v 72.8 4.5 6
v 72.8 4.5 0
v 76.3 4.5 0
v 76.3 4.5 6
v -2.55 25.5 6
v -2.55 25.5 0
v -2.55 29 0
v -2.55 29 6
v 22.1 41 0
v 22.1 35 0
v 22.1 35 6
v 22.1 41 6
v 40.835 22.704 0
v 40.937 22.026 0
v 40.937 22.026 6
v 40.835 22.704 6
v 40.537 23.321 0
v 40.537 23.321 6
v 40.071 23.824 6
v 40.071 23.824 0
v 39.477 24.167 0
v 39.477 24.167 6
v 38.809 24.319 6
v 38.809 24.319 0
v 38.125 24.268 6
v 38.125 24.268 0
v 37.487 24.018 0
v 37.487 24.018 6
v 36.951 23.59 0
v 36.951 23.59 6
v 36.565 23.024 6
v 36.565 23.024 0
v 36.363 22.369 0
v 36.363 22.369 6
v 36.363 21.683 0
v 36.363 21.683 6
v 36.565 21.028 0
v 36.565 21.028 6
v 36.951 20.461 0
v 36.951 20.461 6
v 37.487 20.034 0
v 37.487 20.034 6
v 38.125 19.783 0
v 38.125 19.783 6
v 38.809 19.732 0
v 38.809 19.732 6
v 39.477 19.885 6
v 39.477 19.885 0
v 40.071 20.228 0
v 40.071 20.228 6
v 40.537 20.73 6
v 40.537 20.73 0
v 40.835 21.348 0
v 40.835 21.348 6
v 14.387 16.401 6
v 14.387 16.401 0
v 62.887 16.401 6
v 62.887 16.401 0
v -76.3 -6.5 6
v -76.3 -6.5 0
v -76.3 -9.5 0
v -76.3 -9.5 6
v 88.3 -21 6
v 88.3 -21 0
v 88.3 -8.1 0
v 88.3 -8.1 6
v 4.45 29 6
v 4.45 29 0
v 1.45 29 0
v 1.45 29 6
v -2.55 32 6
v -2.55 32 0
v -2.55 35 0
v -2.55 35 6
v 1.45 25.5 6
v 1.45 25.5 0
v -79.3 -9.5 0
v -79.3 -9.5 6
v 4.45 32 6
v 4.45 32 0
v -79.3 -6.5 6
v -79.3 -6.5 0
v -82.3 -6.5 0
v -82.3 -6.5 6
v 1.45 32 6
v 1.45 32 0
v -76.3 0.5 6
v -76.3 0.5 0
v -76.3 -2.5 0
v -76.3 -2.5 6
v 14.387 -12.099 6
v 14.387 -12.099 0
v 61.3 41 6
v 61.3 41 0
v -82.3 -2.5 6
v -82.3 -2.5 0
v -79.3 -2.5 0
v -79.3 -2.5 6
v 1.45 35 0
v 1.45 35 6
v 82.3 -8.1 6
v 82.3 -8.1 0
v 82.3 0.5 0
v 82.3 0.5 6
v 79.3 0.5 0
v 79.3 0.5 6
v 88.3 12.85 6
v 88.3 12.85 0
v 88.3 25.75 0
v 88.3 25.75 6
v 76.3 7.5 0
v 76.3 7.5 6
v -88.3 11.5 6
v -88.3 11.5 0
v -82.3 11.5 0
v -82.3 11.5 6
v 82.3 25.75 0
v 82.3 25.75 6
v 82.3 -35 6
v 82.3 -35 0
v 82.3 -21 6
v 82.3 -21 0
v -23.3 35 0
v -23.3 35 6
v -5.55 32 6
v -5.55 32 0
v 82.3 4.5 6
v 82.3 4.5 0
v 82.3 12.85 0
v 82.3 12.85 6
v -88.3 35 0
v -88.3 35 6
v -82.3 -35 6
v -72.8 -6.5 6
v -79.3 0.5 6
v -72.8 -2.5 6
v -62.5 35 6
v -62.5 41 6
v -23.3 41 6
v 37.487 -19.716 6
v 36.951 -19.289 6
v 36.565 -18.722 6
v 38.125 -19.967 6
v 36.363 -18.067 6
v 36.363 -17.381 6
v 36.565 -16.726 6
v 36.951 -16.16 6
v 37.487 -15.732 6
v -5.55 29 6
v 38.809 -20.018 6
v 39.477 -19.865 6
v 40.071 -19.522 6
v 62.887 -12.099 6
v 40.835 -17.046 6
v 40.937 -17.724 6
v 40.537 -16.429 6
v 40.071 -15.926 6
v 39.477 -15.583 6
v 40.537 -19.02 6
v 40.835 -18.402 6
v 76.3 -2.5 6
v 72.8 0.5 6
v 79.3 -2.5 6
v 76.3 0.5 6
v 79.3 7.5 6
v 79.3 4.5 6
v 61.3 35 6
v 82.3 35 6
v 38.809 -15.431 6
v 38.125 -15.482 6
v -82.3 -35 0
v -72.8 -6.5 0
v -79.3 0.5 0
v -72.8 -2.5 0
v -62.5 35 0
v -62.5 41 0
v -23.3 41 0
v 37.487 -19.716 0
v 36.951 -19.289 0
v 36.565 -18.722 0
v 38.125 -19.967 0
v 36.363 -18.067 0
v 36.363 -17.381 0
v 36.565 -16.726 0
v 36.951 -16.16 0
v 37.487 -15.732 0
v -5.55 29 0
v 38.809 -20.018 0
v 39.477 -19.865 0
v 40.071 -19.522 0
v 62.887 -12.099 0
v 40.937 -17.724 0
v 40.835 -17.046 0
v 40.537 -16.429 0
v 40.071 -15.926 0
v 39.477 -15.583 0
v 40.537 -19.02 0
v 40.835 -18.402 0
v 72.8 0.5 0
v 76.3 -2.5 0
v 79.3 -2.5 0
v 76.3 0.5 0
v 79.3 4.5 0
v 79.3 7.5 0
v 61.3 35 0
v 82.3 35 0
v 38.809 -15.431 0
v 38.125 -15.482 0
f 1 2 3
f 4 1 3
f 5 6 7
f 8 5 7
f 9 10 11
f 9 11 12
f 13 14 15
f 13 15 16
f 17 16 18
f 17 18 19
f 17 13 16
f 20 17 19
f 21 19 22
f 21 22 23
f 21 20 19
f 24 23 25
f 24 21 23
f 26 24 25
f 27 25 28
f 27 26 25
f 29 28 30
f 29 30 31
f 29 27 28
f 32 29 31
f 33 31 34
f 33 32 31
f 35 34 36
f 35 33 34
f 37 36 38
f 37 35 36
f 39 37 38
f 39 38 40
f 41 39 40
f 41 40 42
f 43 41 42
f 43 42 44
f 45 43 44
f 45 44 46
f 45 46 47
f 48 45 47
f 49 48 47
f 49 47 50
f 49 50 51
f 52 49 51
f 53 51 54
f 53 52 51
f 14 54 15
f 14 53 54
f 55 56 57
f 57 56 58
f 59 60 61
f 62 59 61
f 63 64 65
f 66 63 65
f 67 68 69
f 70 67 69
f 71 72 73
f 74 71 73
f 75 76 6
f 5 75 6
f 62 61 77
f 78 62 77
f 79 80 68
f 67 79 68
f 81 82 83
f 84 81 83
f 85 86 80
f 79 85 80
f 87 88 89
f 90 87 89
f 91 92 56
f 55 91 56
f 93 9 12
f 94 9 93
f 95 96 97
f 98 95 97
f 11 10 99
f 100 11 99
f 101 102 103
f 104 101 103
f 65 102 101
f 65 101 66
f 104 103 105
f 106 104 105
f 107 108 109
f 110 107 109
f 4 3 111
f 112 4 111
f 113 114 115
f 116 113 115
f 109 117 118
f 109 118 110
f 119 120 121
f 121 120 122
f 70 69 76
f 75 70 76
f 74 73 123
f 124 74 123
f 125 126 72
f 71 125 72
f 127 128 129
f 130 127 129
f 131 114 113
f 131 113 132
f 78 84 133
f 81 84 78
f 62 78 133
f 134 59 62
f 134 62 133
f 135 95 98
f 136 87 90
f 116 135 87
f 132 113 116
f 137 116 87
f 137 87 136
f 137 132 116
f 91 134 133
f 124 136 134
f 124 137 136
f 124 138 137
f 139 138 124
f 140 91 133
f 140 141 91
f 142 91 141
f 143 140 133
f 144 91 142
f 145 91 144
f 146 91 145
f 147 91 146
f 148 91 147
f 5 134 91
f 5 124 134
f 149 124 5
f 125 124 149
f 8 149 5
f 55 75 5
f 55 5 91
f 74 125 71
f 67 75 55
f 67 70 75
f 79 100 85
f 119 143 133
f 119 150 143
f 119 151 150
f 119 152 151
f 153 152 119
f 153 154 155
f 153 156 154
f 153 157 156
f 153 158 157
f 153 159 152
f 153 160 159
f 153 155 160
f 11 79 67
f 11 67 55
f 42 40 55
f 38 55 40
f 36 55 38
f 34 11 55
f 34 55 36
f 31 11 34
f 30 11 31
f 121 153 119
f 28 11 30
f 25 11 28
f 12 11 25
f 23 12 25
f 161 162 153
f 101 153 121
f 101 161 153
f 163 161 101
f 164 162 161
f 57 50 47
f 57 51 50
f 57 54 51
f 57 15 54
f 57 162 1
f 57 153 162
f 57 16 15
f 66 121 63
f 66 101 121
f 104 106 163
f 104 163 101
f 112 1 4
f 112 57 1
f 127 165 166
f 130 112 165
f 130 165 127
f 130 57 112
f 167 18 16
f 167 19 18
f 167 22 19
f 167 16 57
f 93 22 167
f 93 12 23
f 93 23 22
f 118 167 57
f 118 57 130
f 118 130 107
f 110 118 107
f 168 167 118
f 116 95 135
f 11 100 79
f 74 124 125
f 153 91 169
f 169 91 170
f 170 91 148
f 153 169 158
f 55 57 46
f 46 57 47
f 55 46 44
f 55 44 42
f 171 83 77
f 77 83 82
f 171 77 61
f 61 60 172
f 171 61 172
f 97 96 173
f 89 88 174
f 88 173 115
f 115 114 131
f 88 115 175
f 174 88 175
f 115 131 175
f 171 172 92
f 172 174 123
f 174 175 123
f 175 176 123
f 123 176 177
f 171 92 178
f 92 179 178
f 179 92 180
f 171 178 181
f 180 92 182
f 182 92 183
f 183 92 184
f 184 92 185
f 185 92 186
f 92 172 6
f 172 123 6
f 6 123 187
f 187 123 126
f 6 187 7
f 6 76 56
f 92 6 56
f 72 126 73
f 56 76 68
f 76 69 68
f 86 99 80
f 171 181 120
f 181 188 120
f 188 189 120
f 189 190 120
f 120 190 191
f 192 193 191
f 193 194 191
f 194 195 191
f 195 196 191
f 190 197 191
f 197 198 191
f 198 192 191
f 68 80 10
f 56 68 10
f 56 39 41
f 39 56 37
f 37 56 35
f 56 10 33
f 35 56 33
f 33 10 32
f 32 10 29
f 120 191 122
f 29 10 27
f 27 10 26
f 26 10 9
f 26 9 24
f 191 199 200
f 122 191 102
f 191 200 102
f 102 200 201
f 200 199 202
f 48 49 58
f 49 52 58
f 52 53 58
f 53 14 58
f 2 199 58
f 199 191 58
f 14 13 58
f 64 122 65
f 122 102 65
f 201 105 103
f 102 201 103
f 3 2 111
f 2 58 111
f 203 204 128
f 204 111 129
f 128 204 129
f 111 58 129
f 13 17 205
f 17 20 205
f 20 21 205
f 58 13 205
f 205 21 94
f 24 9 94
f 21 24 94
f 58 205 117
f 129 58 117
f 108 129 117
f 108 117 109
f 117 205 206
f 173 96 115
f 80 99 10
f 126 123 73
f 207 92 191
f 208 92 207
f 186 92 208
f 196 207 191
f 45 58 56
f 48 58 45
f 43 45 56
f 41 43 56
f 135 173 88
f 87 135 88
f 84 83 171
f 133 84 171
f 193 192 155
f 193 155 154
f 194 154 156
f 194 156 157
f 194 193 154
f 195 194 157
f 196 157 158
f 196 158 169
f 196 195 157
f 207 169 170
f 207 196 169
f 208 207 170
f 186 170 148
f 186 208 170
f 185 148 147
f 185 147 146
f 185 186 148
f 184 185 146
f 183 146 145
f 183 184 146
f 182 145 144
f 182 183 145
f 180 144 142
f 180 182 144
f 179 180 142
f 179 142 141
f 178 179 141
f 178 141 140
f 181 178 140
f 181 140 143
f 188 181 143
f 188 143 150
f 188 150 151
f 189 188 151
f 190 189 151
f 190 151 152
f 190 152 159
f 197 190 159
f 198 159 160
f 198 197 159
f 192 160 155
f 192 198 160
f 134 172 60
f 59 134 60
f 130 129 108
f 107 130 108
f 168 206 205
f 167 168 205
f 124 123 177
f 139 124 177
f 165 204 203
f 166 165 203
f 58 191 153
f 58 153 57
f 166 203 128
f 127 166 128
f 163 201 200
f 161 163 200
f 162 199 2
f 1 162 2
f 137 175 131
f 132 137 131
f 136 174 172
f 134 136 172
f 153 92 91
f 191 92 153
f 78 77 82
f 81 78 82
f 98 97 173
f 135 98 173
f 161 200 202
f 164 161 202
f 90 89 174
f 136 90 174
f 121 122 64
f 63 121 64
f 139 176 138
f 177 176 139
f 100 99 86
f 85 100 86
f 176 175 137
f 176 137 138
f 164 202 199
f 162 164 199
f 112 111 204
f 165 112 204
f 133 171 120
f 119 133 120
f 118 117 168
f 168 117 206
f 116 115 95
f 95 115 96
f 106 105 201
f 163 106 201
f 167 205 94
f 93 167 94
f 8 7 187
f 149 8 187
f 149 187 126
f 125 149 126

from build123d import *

# Parameters (mm, degrees)
F0_R     = 2.3
F0_W     = 48.5
F0_H     = 28.5
F0_W_2   = 6
F0_H_2   = 23.5
F0_W_3   = 39.2
F0_H_3   = 6
F0_H_4   = 12.9
F1_DEPTH = 6


with BuildPart() as f1:
    # F0 (on Top) → F1 (new body)
    with BuildSketch(Plane.XY):
        Polygon((-62.5, 35), (-82.3, 35), (-82.3, 11.5), (-82.3, -2.5), (-79.3, -2.5), (-79.3, 0.5), (-76.3, 0.5), (-76.3, -2.5), (-72.8, -2.5), (-72.8, -4.5), (-72.8, -6.5), (-76.3, -6.5), (-76.3, -9.5), (-79.3, -9.5), (-79.3, -6.5), (-82.3, -6.5), (-82.3, -35), (82.3, -35), (82.3, -21), (82.3, -8.1), (82.3, 0.5), (79.3, 0.5), (79.3, -2.5), (76.3, -2.5), (76.3, 0.5), (72.8, 0.5), (72.8, 4.5), (76.3, 4.5), (76.3, 7.5), (79.3, 7.5), (79.3, 4.5), (82.3, 4.5), (82.3, 12.85), (82.3, 25.75), (82.3, 35), (61.3, 35), (22.1, 35), (1.45, 35), (1.45, 32), (4.45, 32), (4.45, 29), (1.45, 29), (1.45, 25.5), (-2.55, 25.5), (-2.55, 29), (-5.55, 29), (-5.55, 32), (-2.55, 32), (-2.55, 35), (-23.3, 35), align=None)
        with Locations((38.636842, -17.724174)):
            Circle(F0_R, mode=Mode.SUBTRACT)
        with Locations((38.636842, 2.150826)):
            Rectangle(F0_W, F0_H, mode=Mode.SUBTRACT)
        with Locations((38.636842, 22.025826)):
            Circle(F0_R, mode=Mode.SUBTRACT)
        with Locations((-85.3, 23.25)):
            Rectangle(F0_W_2, F0_H_2)
        with Locations((-42.9, 38)):
            Rectangle(F0_W_3, F0_H_3)
        with Locations((41.7, 38)):
            Rectangle(F0_W_3, F0_H_3)
        with Locations((85.3, 19.3)):
            Rectangle(F0_W_2, F0_H_4)
        with Locations((85.3, -14.55)):
            Rectangle(F0_W_2, F0_H_4)
    extrude(amount=F1_DEPTH)


solid = f1.part
